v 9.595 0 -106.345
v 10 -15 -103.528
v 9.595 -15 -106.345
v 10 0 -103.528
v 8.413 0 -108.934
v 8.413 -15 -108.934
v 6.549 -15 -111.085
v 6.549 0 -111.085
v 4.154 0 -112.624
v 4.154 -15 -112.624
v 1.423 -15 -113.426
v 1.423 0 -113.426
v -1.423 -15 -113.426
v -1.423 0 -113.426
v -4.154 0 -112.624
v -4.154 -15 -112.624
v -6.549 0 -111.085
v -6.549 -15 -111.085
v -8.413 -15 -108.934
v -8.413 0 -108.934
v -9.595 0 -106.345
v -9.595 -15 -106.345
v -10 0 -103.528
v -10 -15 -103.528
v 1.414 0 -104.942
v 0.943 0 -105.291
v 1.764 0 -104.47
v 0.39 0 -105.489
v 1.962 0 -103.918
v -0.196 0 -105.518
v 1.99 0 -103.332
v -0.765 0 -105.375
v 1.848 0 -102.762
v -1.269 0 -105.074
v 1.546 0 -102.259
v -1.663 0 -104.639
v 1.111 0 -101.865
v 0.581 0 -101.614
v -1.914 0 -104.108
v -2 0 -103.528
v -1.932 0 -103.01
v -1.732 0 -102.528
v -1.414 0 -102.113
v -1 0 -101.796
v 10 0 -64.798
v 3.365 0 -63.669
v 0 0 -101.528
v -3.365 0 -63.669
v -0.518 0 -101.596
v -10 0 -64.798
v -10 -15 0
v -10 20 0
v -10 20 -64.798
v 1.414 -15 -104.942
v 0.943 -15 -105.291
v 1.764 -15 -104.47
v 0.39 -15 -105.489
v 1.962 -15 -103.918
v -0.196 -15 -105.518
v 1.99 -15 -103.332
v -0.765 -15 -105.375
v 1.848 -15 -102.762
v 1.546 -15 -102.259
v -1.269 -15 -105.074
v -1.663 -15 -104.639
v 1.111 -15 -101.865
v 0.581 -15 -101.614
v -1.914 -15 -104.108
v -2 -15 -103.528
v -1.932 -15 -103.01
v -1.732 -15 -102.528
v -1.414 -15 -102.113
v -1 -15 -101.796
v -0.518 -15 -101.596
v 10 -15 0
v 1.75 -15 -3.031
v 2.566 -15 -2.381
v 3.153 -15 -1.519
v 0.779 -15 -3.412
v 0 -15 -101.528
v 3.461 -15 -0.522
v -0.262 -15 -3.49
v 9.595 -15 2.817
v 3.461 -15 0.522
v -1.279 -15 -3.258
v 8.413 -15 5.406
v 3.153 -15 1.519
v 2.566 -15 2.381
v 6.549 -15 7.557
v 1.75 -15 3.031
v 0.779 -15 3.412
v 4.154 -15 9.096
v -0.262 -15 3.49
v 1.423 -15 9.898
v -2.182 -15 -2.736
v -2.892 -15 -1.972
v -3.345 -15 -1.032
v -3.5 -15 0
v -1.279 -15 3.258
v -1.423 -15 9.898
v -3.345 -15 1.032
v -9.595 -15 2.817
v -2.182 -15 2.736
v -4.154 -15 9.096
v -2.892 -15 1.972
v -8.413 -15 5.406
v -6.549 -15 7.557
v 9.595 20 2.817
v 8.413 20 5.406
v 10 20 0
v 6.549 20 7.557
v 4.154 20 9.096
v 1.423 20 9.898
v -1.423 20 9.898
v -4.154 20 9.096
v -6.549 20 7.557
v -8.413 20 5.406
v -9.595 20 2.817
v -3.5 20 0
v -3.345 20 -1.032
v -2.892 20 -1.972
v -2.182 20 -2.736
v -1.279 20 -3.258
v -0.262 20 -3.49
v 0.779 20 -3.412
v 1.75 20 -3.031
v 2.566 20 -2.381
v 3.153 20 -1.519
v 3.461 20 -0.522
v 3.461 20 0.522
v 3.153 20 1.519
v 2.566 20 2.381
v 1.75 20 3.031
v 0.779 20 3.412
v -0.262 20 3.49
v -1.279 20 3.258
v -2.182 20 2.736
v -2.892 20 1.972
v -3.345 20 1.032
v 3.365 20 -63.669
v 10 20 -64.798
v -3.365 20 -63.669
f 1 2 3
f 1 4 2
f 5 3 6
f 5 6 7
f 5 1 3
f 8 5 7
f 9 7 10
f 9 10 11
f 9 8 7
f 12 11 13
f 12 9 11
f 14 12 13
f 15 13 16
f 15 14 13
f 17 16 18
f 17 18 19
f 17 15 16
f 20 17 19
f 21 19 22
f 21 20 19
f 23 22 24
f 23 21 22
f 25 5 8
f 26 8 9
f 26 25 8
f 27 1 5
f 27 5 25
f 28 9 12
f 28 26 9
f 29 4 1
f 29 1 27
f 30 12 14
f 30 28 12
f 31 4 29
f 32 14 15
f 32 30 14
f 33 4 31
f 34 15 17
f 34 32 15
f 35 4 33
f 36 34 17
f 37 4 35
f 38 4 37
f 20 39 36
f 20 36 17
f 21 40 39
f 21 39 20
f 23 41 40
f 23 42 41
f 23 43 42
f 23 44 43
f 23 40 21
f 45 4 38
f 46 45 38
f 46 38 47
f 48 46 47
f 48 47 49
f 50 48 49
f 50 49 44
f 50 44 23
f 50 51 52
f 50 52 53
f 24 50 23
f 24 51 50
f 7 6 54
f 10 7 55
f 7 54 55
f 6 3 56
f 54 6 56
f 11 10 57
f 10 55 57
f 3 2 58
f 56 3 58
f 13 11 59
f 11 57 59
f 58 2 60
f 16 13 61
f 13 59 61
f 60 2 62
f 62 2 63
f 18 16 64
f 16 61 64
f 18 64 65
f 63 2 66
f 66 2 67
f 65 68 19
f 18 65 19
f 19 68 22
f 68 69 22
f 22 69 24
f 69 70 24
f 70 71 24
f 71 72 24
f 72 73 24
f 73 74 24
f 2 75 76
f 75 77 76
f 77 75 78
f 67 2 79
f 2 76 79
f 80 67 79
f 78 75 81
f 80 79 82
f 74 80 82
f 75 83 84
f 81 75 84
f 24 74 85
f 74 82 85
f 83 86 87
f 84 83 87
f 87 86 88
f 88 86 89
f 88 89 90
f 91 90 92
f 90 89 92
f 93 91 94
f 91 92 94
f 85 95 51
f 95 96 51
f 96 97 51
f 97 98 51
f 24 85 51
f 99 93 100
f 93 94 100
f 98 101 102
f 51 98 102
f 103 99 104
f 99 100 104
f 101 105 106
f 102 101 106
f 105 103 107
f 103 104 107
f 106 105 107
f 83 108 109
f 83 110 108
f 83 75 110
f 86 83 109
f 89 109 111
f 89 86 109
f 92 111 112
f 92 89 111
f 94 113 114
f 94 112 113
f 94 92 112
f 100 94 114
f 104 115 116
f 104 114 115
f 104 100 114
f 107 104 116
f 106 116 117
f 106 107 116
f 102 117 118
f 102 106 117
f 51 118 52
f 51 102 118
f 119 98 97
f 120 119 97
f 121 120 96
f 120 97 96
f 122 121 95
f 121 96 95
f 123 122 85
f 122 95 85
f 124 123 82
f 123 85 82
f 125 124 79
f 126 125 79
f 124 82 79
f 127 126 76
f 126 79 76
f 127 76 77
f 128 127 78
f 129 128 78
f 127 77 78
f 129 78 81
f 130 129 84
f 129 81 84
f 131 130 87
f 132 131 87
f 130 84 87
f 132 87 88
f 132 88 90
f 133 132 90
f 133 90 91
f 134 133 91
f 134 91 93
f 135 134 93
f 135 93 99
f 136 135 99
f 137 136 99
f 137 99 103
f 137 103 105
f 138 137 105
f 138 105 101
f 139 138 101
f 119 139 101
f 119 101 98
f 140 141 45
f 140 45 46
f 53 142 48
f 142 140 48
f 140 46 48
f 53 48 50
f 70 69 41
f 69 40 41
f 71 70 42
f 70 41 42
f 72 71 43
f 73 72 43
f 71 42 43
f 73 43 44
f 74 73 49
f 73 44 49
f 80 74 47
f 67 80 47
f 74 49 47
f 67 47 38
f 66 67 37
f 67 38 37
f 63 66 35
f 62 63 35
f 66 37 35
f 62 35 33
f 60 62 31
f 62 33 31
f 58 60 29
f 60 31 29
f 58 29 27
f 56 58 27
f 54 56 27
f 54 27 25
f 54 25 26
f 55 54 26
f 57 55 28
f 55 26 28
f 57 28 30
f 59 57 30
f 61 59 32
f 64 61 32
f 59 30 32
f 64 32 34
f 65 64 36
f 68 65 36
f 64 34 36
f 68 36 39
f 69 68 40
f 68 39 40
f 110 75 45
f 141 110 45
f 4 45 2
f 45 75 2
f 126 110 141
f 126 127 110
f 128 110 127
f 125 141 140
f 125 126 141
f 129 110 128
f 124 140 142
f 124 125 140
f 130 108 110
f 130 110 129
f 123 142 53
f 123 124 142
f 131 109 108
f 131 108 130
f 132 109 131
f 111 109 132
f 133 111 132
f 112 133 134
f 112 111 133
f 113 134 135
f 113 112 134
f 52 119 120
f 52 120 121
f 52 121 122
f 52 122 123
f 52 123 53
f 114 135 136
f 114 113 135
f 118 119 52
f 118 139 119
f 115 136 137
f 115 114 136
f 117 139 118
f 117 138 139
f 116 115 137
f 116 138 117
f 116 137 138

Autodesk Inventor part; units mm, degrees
ref_plane "YZ Plane" through (0, 0, 0) normal (1, 0, 0) x (0, 1, 0)
ref_plane "XZ Plane" through (0, 0, 0) normal (0, 1, 0) x (-1, 0, 0)
ref_plane "XY Plane" through (0, 0, 0) normal (0, 0, 1) x (1, 0, 0)
sketch "Sketch1" plane through (0, 0, 0) normal (0, 1, 0) x (-1, 0, 0)
  circle A0 centre (0, 0) radius 100
  line L0 (0, 0) -> (18.5658, -69.2885)
  line L1 (0, 0) -> (0, -103.5276)
  arc A1 (24.6448, -72.6673) -> (14.9907, -75.2542) centre (0, 0) ccw
  circle A2 centre (25.8819, -96.5926) radius 5
  arc A3 (24.729, -72.9816) -> (15.0747, -75.5678) centre (19.8599, -74.1181) ccw
  line L2 (30.6777, -95.1782) -> (24.6448, -72.6673)
  line L3 (21.0523, -97.8867) -> (14.9907, -75.2542)
  circle A4 centre (0, -103.5276) radius 11.6229
  line L4 (21.0523, -97.8867) -> (25.8819, -96.5926)
  arc A5 (-25.8819, -96.5926) -> (26.7197, -101.5219) centre (0, -103.5276) ccw
  circle A6 centre (0, -103.5276) radius 40
  arc A7 (57.9067, -50.8394) -> (50.8389, -57.9063) centre (54.2582, -54.2582) ccw
  line L5 (67.1751, -74.2462) -> (50.6094, -57.6767)
  line L6 (74.1567, -67.0879) -> (57.6767, -50.6094)
  circle A8 centre (70.7107, -70.7107) radius 5
  circle A9 centre (51.7638, -89.6575) radius 11.6229
  arc A10 (75.5684, -15.0748) -> (72.9809, -24.7289) centre (74.1181, -19.8599) ccw
  line L7 (95.2985, -30.7115) -> (72.6673, -24.6448)
  line L8 (97.7655, -21.0214) -> (75.2542, -14.9907)
  circle A11 centre (96.5926, -25.8819) radius 5
  circle A12 centre (89.6575, -51.7638) radius 11.6229
  arc A13 (72.9816, 24.729) -> (75.5678, 15.0747) centre (74.1181, 19.8599) ccw
  line L9 (97.8867, 21.0523) -> (75.2542, 14.9907)
  line L10 (95.1782, 30.6777) -> (72.6673, 24.6448)
  circle A14 centre (96.5926, 25.8819) radius 5
  circle A15 centre (103.5276, 0) radius 11.6229
  arc A16 (50.8394, 57.9067) -> (57.9063, 50.8389) centre (54.2582, 54.2582) ccw
  line L11 (74.2462, 67.1751) -> (57.6767, 50.6094)
  line L12 (67.0879, 74.1567) -> (50.6094, 57.6767)
  circle A17 centre (70.7107, 70.7107) radius 5
  circle A18 centre (89.6575, 51.7638) radius 11.6229
  arc A19 (15.0748, 75.5684) -> (24.7289, 72.9809) centre (19.8599, 74.1181) ccw
  line L13 (30.7115, 95.2985) -> (24.6448, 72.6673)
  line L14 (21.0214, 97.7655) -> (14.9907, 75.2542)
  circle A20 centre (25.8819, 96.5926) radius 5
  circle A21 centre (51.7638, 89.6575) radius 11.6229
  arc A22 (-24.729, 72.9816) -> (-15.0747, 75.5678) centre (-19.8599, 74.1181) ccw
  line L15 (-21.0523, 97.8867) -> (-14.9907, 75.2542)
  line L16 (-30.6777, 95.1782) -> (-24.6448, 72.6673)
  circle A23 centre (-25.8819, 96.5926) radius 5
  circle A24 centre (0, 103.5276) radius 11.6229
  arc A25 (-57.9067, 50.8394) -> (-50.8389, 57.9063) centre (-54.2582, 54.2582) ccw
  line L17 (-67.1751, 74.2462) -> (-50.6094, 57.6767)
  line L18 (-74.1567, 67.0879) -> (-57.6767, 50.6094)
  circle A26 centre (-70.7107, 70.7107) radius 5
  circle A27 centre (-51.7638, 89.6575) radius 11.6229
  arc A28 (-75.5684, 15.0748) -> (-72.9809, 24.7289) centre (-74.1181, 19.8599) ccw
  line L19 (-95.2985, 30.7115) -> (-72.6673, 24.6448)
  line L20 (-97.7655, 21.0214) -> (-75.2542, 14.9907)
  circle A29 centre (-96.5926, 25.8819) radius 5
  circle A30 centre (-89.6575, 51.7638) radius 11.6229
  arc A31 (-72.9816, -24.729) -> (-75.5678, -15.0747) centre (-74.1181, -19.8599) ccw
  line L21 (-97.8867, -21.0523) -> (-75.2542, -14.9907)
  line L22 (-95.1782, -30.6777) -> (-72.6673, -24.6448)
  circle A32 centre (-96.5926, -25.8819) radius 5
  circle A33 centre (-103.5276, 0) radius 11.6229
  arc A34 (-50.8394, -57.9067) -> (-57.9063, -50.8389) centre (-54.2582, -54.2582) ccw
  line L23 (-74.2462, -67.1751) -> (-57.6767, -50.6094)
  line L24 (-67.0879, -74.1567) -> (-50.6094, -57.6767)
  circle A35 centre (-70.7107, -70.7107) radius 5
  circle A36 centre (-89.6575, -51.7638) radius 11.6229
  arc A37 (-15.0748, -75.5684) -> (-24.7289, -72.9809) centre (-19.8599, -74.1181) ccw
  line L25 (-30.7115, -95.2985) -> (-24.6448, -72.6673)
  line L26 (-21.0214, -97.7655) -> (-14.9907, -75.2542)
  circle A38 centre (-25.8819, -96.5926) radius 5
  circle A39 centre (-51.7638, -89.6575) radius 11.6229
  circle A40 centre (0, 0) radius 3.5
  circle A41 centre (0, -103.5276) radius 2
  circle A42 centre (0, 0) radius 10
  circle A43 centre (0, -103.5276) radius 10
  line L27 (10, 0) -> (10, -103.5276)
  line L28 (-10, 0) -> (-10, -103.5276)
  point P0 (50.7227, -50.7227)
  point P1 (73.9009, -74.5607)
  point P2 (69.2885, -18.5658)
  point P3 (101.2804, -27.621)
  point P4 (69.2885, 18.5658)
  point P5 (101.5219, 26.7197)
  point P6 (50.7227, 50.7227)
  point P7 (74.5607, 73.9009)
  point P8 (18.5658, 69.2885)
  point P9 (27.621, 101.2804)
  point P10 (-18.5658, 69.2885)
  point P11 (-26.7197, 101.5219)
  point P12 (-50.7227, 50.7227)
  point P13 (-73.9009, 74.5607)
  point P14 (-69.2885, 18.5658)
  point P15 (-101.2804, 27.621)
  point P16 (-69.2885, -18.5658)
  point P17 (-101.5219, -26.7197)
  point P18 (-50.7227, -50.7227)
  point P19 (-74.5607, -73.9009)
  point P20 (-18.5658, -69.2885)
  point P21 (-27.621, -101.2804)
  point P22 (40.2917, -91.5236)
  point P23 (59.1159, -80.6555)
  point P24 (67.0867, -74.1578)
  point P25 (80.6555, -59.1159)
  point P26 (91.5236, -40.2917)
  point P27 (95.1777, -30.6791)
  point P28 (99.4077, -10.8682)
  point P29 (99.4077, 10.8682)
  point P30 (97.7659, 21.0199)
  point P31 (91.5236, 40.2917)
  point P32 (80.6555, 59.1159)
  point P33 (74.1578, 67.0867)
  point P34 (59.1159, 80.6555)
  point P35 (40.2917, 91.5236)
  point P36 (30.6791, 95.1777)
  point P37 (10.8682, 99.4077)
  point P38 (-10.8682, 99.4077)
  point P39 (-21.0199, 97.7659)
  point P40 (-40.2917, 91.5236)
  point P41 (-59.1159, 80.6555)
  point P42 (-67.0867, 74.1578)
  point P43 (-80.6555, 59.1159)
  point P44 (-91.5236, 40.2917)
  point P45 (-95.1777, 30.6791)
  point P46 (-99.4077, 10.8682)
  point P47 (-99.4077, -10.8682)
  point P48 (-97.7659, -21.0199)
  point P49 (-91.5236, -40.2917)
  point P50 (-80.6555, -59.1159)
  point P51 (-74.1578, -67.0867)
  point P52 (-59.1159, -80.6555)
  point P53 (-40.2917, -91.5236)
  point P54 (-30.6791, -95.1777)
  point P55 (-10.8682, -99.4077)
  point P56 (10.8682, -99.4077)
  point P57 (21.0199, -97.7659)
  point P58 (-10, -64.7978)
  point P59 (10, -64.7978)
  dimension "d2" = 200
  dimension "d3" = 15
  dimension "d4" = 10
  dimension "d5" = 10
  dimension "d6" = 80
  dimension "d7" = 360
  dimension "d8" = 7
  dimension "d9" = 4
  dimension "d10" = 20
  dimension "d11" = 20
extrude "Extrusion1" add sketch "Sketch1" along normal blind 20 contours L28 A42 L1 A6 | L1 A42 L0 L27 A6 | A42 L0 A40 L1 | L1 A40 L0 A42 | L27 L0 A42
extrude "Extrusion2" add sketch "Sketch1" against normal blind 15 contours L28 A4 L1 A43 A0 | A0 A43 L28 | L28 A1 L1 A4 | A43 L1 A0 | A0 A43 | A4 L27 A0 A43 L1 | L1 A1 L27 A4 | L28 A6 L1 A1 | L1 A43 A0 | A43 A0 L27 | L1 A6 L27 A1 | L28 A42 L1 A6 | L1 A42 L0 L27 A6 | A42 L0 A40 L1 | L1 A40 L0 A42 | L27 L0 A42
properties part number "SC-1-02-Bridge"
